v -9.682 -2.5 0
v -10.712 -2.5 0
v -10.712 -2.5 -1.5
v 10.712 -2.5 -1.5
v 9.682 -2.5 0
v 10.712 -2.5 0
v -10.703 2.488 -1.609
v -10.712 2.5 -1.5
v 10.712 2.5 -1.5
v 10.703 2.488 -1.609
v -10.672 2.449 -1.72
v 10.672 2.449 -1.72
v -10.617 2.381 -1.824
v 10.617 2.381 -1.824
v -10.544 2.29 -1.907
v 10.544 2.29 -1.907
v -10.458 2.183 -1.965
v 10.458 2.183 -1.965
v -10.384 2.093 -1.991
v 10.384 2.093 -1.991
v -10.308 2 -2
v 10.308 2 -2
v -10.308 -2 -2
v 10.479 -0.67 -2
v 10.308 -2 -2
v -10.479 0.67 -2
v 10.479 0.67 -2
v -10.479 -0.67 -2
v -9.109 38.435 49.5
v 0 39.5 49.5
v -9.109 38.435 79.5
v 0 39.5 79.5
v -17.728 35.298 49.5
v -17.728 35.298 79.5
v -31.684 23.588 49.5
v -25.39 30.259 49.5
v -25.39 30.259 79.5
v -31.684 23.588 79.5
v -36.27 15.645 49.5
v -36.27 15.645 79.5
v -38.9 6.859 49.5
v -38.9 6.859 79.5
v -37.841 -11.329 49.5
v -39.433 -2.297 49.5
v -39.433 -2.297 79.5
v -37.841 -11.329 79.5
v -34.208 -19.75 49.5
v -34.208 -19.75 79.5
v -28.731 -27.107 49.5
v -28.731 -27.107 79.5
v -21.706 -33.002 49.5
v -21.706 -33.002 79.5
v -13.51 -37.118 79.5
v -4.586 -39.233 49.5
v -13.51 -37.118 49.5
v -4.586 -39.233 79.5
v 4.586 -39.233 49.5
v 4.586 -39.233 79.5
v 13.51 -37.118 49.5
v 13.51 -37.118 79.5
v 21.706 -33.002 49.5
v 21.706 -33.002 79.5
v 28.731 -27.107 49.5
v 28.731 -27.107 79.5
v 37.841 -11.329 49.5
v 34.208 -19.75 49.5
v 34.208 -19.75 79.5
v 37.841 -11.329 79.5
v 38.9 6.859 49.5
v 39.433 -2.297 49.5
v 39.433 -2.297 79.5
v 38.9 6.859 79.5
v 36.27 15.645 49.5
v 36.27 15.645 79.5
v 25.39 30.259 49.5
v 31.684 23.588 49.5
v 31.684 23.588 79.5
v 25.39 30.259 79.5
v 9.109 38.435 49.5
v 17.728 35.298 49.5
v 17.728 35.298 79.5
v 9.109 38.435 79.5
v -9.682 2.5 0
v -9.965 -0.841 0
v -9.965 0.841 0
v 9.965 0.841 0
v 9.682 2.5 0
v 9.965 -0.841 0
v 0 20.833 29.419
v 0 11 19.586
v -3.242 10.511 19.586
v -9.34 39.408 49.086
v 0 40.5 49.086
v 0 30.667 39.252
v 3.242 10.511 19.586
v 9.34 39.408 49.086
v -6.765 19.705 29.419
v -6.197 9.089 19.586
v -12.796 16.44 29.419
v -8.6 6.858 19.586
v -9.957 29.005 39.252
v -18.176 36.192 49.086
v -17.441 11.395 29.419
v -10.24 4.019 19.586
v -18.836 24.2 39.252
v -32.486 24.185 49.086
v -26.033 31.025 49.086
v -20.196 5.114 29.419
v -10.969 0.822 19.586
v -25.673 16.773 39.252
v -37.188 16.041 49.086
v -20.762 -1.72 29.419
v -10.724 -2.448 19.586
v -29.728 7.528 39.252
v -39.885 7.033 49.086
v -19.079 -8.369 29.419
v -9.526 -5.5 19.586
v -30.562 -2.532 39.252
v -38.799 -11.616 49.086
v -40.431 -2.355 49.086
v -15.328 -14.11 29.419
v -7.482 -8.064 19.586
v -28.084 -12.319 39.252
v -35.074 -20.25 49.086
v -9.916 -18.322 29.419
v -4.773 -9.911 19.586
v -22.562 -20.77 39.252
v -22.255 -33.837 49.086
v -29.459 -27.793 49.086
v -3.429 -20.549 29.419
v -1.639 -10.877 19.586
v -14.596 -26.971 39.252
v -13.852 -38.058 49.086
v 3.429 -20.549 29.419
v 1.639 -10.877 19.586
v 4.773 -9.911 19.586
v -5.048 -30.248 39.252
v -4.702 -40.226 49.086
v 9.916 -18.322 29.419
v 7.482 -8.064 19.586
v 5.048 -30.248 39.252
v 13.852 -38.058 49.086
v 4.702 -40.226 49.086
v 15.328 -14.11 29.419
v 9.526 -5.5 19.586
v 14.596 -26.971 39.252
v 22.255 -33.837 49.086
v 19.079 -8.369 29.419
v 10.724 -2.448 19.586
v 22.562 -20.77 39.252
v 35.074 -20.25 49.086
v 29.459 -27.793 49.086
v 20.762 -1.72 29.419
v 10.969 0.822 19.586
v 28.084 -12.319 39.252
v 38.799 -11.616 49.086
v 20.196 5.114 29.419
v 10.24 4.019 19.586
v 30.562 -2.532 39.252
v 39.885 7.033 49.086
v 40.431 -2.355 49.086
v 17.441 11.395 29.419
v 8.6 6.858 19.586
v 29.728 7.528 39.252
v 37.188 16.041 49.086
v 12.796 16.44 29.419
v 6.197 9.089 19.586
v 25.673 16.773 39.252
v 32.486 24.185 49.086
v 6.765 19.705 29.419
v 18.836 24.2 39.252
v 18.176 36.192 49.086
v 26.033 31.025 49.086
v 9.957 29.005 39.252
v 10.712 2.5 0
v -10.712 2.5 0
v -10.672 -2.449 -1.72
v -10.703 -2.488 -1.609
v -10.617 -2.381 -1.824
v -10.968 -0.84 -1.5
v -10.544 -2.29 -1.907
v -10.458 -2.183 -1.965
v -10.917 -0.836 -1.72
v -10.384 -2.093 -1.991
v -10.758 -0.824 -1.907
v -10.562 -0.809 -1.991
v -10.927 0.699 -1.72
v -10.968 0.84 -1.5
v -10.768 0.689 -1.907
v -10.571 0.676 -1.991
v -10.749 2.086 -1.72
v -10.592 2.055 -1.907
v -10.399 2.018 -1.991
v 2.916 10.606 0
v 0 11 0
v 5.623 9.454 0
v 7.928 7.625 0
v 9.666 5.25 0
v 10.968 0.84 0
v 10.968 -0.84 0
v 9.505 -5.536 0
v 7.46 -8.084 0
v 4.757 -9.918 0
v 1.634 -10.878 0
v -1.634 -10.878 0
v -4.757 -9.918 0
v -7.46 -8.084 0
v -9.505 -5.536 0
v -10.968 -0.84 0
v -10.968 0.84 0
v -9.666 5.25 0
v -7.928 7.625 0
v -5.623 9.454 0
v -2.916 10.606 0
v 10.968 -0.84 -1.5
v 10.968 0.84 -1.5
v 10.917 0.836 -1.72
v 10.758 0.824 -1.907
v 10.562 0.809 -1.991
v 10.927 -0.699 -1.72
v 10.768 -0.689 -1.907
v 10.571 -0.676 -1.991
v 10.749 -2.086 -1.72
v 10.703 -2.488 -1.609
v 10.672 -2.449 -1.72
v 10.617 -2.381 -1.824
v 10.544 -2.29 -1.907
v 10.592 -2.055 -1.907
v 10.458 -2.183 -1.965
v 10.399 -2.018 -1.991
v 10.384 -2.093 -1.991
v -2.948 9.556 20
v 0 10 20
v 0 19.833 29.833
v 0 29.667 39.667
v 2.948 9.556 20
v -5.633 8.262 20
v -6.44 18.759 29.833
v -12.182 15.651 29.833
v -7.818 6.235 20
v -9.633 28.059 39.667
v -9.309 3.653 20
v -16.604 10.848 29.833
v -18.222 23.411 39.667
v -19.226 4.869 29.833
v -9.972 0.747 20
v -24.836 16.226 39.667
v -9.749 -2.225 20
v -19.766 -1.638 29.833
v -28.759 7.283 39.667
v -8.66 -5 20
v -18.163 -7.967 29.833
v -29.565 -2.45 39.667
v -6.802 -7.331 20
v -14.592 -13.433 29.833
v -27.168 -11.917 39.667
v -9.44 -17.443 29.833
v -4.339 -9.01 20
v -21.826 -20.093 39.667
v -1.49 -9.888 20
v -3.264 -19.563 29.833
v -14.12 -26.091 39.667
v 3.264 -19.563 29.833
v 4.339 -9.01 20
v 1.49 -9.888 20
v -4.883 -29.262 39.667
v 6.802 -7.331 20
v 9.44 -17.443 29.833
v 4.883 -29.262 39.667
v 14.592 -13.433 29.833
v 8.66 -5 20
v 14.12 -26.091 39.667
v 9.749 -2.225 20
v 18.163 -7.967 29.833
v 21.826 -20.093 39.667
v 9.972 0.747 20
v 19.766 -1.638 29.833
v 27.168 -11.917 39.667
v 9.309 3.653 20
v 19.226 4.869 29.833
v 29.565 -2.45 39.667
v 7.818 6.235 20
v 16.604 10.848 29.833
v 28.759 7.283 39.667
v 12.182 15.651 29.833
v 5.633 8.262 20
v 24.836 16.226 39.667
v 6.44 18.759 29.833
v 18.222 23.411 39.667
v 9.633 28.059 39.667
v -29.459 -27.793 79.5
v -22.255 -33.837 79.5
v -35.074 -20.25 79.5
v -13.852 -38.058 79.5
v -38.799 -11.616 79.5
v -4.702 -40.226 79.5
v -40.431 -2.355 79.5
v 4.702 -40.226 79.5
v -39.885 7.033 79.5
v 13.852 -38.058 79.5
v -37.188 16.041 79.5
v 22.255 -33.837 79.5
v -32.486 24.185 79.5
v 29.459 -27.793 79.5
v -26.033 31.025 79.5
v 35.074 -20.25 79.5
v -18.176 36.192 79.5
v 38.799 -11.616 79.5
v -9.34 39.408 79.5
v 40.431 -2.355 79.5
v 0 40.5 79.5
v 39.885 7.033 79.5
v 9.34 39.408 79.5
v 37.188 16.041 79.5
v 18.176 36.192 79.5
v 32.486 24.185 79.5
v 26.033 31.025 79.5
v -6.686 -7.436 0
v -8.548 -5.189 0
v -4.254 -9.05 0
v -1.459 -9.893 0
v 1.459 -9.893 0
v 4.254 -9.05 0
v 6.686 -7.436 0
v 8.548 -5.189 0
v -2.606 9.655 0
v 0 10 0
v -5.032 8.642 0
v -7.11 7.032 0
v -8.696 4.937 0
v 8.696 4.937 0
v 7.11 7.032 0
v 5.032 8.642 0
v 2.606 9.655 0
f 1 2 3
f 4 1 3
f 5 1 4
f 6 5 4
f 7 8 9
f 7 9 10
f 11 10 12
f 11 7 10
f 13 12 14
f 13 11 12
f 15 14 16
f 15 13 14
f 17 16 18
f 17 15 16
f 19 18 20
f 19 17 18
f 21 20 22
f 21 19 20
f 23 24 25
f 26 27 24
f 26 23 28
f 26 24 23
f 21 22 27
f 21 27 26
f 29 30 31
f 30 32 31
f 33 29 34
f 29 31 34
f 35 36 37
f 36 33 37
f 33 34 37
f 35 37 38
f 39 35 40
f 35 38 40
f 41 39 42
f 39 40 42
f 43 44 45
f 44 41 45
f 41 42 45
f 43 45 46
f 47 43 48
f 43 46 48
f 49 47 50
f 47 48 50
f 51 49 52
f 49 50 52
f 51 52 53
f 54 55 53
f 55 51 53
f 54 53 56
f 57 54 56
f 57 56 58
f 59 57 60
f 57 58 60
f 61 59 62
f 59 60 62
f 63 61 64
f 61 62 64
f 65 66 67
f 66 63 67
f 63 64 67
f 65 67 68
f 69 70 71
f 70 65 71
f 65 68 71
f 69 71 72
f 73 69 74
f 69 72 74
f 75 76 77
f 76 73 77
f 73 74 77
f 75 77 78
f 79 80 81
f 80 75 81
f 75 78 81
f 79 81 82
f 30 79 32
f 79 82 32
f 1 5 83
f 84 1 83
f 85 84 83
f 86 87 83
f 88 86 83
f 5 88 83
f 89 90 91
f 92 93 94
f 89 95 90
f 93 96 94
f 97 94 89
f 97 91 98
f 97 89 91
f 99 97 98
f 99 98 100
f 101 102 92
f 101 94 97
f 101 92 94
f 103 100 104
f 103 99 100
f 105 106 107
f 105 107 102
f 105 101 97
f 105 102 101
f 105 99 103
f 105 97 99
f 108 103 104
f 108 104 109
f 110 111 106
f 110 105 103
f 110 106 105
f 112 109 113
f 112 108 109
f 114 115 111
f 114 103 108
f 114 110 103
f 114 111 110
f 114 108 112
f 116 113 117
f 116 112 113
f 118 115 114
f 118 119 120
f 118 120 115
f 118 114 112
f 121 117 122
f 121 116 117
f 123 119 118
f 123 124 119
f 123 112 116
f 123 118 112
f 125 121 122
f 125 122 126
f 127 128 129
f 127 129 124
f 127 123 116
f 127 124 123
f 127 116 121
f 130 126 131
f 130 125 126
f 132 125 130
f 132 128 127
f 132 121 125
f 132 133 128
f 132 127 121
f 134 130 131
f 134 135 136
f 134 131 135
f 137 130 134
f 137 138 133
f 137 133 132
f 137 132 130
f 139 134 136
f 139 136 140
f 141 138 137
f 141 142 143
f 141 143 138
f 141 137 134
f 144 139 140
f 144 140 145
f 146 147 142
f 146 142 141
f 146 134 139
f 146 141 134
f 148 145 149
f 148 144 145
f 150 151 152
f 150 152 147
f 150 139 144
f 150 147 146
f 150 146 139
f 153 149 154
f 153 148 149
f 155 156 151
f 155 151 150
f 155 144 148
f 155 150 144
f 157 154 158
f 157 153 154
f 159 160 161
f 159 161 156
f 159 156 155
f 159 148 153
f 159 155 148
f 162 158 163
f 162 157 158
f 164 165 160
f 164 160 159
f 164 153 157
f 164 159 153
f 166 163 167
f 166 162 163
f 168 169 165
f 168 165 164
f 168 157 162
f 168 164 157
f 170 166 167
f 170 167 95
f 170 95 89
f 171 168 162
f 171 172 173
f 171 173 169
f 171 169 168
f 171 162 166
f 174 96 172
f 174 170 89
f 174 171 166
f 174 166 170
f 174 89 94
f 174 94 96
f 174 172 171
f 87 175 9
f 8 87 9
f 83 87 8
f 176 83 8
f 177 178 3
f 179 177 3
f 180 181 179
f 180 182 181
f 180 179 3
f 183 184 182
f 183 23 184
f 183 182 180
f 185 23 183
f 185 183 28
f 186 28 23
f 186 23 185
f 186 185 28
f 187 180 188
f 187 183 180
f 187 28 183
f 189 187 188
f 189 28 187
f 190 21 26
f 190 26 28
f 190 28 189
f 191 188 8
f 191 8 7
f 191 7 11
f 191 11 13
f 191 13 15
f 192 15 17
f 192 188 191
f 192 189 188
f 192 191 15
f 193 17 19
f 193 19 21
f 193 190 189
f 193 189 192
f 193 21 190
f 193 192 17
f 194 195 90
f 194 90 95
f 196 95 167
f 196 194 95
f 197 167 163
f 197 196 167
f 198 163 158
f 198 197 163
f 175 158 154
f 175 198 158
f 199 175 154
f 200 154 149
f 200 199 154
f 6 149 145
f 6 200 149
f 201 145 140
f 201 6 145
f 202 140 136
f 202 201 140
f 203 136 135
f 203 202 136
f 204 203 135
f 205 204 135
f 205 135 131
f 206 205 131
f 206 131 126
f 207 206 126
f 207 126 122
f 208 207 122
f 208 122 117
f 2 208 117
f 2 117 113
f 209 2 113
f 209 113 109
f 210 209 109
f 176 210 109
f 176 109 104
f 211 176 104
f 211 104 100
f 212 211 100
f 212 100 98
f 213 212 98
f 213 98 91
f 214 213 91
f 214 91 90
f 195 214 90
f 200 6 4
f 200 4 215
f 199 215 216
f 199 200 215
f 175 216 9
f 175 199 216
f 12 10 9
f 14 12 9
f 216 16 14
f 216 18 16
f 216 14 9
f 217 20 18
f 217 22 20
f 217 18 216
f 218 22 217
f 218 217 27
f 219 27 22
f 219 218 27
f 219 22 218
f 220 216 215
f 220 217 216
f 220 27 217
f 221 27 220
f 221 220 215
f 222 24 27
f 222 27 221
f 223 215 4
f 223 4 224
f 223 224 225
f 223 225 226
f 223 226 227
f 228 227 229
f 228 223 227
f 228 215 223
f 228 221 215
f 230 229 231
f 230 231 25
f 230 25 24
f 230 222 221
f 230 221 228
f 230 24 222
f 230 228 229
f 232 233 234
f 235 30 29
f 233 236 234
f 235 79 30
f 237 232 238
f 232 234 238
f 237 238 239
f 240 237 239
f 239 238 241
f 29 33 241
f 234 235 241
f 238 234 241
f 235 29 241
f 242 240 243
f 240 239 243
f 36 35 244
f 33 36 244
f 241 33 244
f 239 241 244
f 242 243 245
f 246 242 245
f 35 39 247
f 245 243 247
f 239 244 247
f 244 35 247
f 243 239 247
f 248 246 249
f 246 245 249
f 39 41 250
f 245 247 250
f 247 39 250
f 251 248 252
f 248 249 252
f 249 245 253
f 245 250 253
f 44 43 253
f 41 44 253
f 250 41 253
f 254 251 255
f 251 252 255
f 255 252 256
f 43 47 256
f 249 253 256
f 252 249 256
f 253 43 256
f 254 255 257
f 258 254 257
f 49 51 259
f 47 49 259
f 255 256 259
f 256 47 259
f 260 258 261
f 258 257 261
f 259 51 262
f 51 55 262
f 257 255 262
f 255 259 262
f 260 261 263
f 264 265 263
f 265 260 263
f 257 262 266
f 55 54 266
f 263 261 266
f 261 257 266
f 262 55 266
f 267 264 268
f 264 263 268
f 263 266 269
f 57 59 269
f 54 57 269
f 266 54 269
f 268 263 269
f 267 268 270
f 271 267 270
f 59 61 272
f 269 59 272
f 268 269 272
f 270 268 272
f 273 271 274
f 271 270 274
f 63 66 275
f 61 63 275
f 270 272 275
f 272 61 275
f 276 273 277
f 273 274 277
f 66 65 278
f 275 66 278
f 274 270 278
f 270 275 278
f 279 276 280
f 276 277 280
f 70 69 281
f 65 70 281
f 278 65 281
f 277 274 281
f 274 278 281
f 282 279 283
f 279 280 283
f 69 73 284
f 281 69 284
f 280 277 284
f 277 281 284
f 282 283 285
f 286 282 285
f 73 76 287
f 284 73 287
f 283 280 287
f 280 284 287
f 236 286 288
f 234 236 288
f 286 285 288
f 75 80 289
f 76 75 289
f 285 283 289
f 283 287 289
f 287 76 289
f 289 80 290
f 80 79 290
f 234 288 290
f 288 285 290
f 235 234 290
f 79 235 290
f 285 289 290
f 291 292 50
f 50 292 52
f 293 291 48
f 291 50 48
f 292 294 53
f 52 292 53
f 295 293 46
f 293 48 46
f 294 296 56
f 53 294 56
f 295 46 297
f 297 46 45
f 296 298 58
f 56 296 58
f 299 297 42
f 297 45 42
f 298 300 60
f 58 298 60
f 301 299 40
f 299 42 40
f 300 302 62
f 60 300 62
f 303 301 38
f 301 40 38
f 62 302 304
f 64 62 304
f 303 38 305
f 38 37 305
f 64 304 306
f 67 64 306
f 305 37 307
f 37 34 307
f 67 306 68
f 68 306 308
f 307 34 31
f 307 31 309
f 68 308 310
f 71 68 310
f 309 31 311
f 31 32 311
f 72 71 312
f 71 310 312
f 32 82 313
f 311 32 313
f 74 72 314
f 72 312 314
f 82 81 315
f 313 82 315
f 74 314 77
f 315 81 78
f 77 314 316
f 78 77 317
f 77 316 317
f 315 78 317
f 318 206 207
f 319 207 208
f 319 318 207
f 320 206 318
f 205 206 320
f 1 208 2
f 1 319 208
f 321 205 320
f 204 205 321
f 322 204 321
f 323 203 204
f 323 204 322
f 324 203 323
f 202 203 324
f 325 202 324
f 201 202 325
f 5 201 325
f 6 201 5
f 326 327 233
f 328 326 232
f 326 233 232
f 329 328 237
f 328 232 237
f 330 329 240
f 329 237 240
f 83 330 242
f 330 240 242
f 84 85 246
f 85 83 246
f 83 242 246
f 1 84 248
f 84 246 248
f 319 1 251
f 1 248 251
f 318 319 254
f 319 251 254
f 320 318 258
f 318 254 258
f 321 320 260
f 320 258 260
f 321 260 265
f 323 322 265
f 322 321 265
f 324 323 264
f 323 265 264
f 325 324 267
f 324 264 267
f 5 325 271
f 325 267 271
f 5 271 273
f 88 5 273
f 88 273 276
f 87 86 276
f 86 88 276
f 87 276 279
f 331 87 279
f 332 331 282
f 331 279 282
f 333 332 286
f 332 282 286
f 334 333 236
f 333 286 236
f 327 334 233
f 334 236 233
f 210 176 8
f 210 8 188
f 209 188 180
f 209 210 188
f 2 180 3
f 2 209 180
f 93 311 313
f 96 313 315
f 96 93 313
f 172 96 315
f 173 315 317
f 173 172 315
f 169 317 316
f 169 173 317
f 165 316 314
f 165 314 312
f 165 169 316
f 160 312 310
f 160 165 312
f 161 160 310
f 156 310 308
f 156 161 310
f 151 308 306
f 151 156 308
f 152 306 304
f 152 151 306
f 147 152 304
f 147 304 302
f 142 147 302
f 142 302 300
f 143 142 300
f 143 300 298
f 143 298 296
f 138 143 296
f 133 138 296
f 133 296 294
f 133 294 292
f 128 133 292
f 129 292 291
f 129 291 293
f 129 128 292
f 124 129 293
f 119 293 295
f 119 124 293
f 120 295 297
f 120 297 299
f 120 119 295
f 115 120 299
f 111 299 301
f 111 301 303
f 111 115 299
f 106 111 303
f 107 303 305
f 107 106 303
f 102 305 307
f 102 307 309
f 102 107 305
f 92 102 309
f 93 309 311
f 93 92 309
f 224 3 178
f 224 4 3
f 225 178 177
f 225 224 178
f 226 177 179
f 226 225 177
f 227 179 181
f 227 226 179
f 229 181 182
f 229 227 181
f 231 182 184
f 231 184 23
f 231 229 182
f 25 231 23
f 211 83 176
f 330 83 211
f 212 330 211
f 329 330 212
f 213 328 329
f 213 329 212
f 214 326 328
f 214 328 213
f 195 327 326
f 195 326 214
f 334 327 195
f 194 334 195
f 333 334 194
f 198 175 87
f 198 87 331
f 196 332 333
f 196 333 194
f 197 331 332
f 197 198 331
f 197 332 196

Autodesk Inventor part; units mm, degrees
ref_plane "YZ Plane" through (0, 0, 0) normal (1, 0, 0) x (0, 1, 0)
ref_plane "XZ Plane" through (0, 0, 0) normal (0, 1, 0) x (-1, 0, 0)
ref_plane "XY Plane" through (0, 0, 0) normal (0, 0, 1) x (1, 0, 0)
sketch "Sketch1" plane through (0, 0, 0) normal (1, 0, 0) x (0, 1, 0)
  line L0 (10, 0) -> (10, 20)
  line L1 (10, 20) -> (39.5, 49.5)
  line L2 (39.5, 49.5) -> (39.5, 79.5)
  line L3 (0, 79.5) -> (0, 0) construction
  line L4 (10, 20) -> (10, 79.5) construction
  line L5 (39.5, 79.5) -> (40.5, 79.5)
  line L6 (40.5, 79.5) -> (40.5, 49.0858)
  line L7 (40.5, 49.0858) -> (11, 19.5858)
  line L8 (11, 19.5858) -> (11, 0)
  line L9 (11, 0) -> (10, 0)
  dimension "Outlet_Height" = 20
  dimension "Funnel_Angle" = 45
  dimension "Inlet_Diameter" = 79
  dimension "Outlet_Diameter" = 20
  dimension "d23" = 1
  dimension "d24" = 1
  dimension "d25" = 1
  dimension "Inlet_Height" = 30
revolve "Revolution1" add sketch "Sketch1" angle 360 about axis through (0, 0, 79.5) along (0, 0, -1)
sketch "Sketch4" plane through (0, 0, 0) normal (0, 0, -1) x (-1, 0, 0)
  line L0 (0, 0) -> (-10.7121, 2.5) construction
  line L1 (0, 0) -> (-48.7838, 0) construction
  line L2 (0, 0) -> (-10.7121, -2.5) construction
  arc A0 (-10.7121, 2.5) -> (-10.7121, -2.5) centre (0, 0) ccw
  line L3 (0, 0) -> (0, 13.9156) construction
  arc A1 (10.7121, -2.5) -> (10.7121, 2.5) centre (0, 0) ccw
  line L4 (-10.7121, 2.5) -> (10.7121, 2.5)
  line L5 (10.7121, -2.5) -> (-10.7121, -2.5)
  circle A2 centre (0, 0) radius 11 projected
  dimension "Bridge_Width" = 5
extrude "Extrusion1" add sketch "Sketch4" along normal blind 2 contours L4 A1 L5 A0
sketch "Sketch5" plane through (0, 0, -2) normal (0, 0, -1) x (-1, 0, 0)
  circle A0 centre (0, 0) radius 1.5
  dimension "Bridge_Hole" = 3
extrude "Extrusion2" [suppressed]
fillet "Fillet1" radius 0.5 4 edges at (11, 0, -2) (-11, 0, -2) (0, -2.5, -2) (0, 2.5, -2)
equation "\"d23\" = Wall_Thickness"
equation "\"d24\" = Wall_Thickness"
equation "\"d25\" = Wall_Thickness"
equation "\"Wall_Thickness\" = 1"
properties part number "Funnel"
